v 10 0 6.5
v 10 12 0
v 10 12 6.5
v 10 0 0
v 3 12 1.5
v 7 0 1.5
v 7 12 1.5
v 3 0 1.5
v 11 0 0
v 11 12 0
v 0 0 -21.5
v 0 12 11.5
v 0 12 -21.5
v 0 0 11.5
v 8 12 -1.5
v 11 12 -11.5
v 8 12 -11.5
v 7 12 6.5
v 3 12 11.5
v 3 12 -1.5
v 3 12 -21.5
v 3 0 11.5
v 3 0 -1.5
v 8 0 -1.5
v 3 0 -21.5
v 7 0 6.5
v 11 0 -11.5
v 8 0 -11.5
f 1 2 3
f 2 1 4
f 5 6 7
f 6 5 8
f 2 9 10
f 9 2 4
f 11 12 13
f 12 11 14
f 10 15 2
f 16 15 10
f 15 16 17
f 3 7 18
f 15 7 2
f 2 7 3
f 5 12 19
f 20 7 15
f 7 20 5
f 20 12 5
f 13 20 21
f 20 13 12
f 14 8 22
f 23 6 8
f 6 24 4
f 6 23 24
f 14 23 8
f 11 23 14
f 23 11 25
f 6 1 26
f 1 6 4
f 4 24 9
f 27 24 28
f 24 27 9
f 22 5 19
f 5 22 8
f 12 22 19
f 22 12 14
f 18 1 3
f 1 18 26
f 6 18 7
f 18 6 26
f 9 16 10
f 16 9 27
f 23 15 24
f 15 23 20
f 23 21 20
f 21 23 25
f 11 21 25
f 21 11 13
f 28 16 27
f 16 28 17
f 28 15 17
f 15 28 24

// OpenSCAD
//smart phone thick in mm
smartphone_thick = 4; // [1:20]


//laptop screen thick in mm
laptop_screen_thick = 5; // [10:25]

// thing border thick in mm
my_thing_thick = 3; // [2:5]

// thing length
my_thing_length = 12; //[10:20]

//upper back high
upper_back_high = 10; // [10:20]

//upper front high
upper_front_high = 5; // [5:10]

//lower back high
lower_back_high = 20; // [10:20]

//lower front high
lower_front_high = 10; // [10:20]

upperPart();
lowerPart();

module upperPart(){    
    cube([smartphone_thick + my_thing_thick * 2 , my_thing_length, my_thing_thick/2]);
    translate([0, 0, my_thing_thick/2]) cube([my_thing_thick, my_thing_length, upper_back_high]);
    translate([my_thing_thick + smartphone_thick, 0, my_thing_thick/2]) cube([my_thing_thick, my_thing_length, upper_front_high]);
    
}

module lowerPart(){
    translate([0,0, -my_thing_thick/2]) cube([laptop_screen_thick + my_thing_thick * 2 , my_thing_length, my_thing_thick/2]);
    translate([0, 0, - lower_back_high - my_thing_thick/2]) cube([my_thing_thick, my_thing_length, lower_back_high]);
    translate([my_thing_thick + laptop_screen_thick, 0, - lower_front_high - my_thing_thick/2]) cube([my_thing_thick, my_thing_length, lower_front_high]);
    
}
